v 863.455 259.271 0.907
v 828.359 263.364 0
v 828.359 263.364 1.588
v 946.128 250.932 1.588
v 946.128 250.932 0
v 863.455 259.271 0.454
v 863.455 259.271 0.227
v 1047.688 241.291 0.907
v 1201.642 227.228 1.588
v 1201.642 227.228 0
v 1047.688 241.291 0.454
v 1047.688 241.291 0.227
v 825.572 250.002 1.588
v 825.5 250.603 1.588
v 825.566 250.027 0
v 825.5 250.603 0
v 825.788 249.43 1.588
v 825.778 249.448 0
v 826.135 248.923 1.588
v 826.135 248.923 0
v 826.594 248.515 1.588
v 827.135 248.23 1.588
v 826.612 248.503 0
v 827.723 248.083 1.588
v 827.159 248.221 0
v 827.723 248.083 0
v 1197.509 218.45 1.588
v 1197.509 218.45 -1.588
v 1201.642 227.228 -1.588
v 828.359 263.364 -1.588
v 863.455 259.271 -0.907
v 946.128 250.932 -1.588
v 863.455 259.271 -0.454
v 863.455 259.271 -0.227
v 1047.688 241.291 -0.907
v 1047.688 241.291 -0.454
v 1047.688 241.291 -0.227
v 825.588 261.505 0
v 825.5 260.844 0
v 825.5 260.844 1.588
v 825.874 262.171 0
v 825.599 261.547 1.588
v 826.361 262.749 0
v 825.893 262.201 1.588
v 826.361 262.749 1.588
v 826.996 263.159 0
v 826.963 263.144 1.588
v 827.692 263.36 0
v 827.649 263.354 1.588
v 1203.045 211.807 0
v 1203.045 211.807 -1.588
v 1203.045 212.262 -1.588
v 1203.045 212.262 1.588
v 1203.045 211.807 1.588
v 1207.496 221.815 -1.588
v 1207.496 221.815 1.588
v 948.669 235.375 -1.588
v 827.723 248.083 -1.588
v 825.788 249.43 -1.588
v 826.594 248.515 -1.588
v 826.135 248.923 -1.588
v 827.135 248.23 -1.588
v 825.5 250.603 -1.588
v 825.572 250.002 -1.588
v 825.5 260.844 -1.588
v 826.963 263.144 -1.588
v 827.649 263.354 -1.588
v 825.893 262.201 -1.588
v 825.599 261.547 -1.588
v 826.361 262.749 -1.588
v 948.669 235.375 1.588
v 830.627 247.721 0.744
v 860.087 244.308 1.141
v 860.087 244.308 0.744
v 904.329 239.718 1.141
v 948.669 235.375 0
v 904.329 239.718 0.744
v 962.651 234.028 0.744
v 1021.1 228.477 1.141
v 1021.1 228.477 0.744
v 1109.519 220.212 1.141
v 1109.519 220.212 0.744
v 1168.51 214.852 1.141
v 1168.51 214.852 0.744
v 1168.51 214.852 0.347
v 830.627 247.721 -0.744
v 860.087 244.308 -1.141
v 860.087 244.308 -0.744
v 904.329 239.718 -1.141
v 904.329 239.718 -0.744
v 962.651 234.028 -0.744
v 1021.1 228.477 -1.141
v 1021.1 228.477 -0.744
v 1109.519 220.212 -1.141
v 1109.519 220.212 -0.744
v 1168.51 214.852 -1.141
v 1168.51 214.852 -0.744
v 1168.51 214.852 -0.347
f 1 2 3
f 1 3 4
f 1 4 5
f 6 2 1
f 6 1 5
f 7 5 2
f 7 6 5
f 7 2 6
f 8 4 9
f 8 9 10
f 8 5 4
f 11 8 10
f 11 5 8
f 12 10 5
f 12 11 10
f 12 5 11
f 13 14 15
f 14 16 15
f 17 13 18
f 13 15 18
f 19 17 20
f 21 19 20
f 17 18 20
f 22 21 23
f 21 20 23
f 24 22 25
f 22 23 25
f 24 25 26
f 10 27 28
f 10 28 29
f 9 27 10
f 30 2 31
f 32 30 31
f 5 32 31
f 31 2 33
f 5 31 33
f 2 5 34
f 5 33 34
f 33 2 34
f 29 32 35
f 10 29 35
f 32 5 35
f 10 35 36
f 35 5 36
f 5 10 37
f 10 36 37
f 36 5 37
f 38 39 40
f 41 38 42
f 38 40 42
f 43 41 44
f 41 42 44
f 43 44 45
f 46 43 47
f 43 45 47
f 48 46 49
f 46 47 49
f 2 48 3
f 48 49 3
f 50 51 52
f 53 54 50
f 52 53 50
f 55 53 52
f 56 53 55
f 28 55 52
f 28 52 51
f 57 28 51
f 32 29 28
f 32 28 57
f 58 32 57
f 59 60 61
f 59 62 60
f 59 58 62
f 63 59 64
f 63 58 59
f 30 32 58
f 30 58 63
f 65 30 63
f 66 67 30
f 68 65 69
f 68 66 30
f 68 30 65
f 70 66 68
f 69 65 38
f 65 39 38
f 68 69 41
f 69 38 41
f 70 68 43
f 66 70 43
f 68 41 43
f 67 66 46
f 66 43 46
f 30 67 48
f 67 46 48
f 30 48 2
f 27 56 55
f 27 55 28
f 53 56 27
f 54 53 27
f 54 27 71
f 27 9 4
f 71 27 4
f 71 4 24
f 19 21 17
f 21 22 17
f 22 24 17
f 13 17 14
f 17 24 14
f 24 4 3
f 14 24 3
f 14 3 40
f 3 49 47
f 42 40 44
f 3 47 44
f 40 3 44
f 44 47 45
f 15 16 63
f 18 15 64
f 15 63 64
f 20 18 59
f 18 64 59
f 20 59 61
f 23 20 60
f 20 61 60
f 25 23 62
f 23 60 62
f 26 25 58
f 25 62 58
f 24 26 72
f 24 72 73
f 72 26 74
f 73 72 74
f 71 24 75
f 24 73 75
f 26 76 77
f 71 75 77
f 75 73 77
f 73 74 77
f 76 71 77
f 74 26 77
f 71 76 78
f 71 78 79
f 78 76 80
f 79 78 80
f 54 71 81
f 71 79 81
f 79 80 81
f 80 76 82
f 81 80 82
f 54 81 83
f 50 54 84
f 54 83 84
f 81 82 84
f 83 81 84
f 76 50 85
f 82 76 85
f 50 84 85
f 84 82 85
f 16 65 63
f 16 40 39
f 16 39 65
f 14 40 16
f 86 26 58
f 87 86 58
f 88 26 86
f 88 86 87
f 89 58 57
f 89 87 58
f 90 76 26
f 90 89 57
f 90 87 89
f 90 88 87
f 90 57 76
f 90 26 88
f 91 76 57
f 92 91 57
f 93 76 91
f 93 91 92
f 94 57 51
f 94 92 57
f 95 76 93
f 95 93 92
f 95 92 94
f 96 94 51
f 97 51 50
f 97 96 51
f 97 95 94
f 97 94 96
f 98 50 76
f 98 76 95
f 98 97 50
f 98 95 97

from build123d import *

# Parameters (mm, degrees)
BOSS_EXTRUDE1_DEPTH = 1.5875
FILLET1_R           = 2.54
CUT_EXTRUDE1_DEPTH  = 7.62


with BuildPart() as part:
    # Sketch2 → Boss-Extrude1 (new body, symmetric)
    with BuildSketch(Plane.XY):
        with BuildLine():
            add(Edge.make_bspline(
                [(825.5, 263.72872798), (833.004293944, 262.763036085), (840.535916247, 261.846014478), (848.126574562, 260.964164828), (892.90639318, 255.945629274), (937.686211733, 251.779150949), (973.452075064, 248.227669425), (1071.946672141, 239.051054038), (1170.441269319, 229.731506738), (1231.791940344, 224.503945813), (1324.899336146, 216.790627817), (1418.006730935, 209.040117978), (1449.742935921, 206.361809936), (1636.928606778, 190.521130342), (1824.114277635, 175.409157235), (1979.966947376, 164.299650253), (2156.268639429, 150.414433314), (2332.570330468, 133.857216402), (2354.212983157, 131.78508222), (2394.341467798, 127.847039259), (2434.469952439, 123.717187755), (2453.57670361, 121.704562273), (2472.669581058, 119.647220503), (2491.74, 117.547195763)],
                knots=[78.681340958, 78.681340958, 78.681340958, 78.681340958, 78.681340958, 78.681340958, 82.46579272, 82.46579272, 82.46579272, 100.7932901, 100.7932901, 100.7932901, 131.0989539, 131.0989539, 131.0989539, 146.7691983, 146.7691983, 146.7691983, 223.5339586, 223.5339586, 223.5339586, 233.9431167, 233.9431167, 233.9431167, 243.40815085, 243.40815085, 243.40815085, 243.40815085, 243.40815085, 243.40815085], degree=5))
            Line((825.5, 263.72872798), (825.5, 248.364439806))
            add(Edge.make_bspline(
                [(825.5, 248.364439806), (827.20768691, 248.14708351), (833.784664511, 247.321927102), (845.28106727, 245.953419483), (860.086531547, 244.295598067), (879.830703434, 242.186646028), (904.369967092, 239.698279806), (933.571022669, 236.832150625), (962.642718041, 234.023667741), (991.762593943, 231.241975908), (1021.072010315, 228.475862291), (1060.376437315, 224.796956681), (1109.513015577, 220.184378862), (1168.511190361, 214.817071985), (1227.500129793, 209.662054042), (1306.133167947, 203.021178328), (1404.361477105, 194.920725932), (1522.239851071, 184.918066624), (1640.182856491, 175.167007786), (1758.165352567, 165.757639485), (1876.155384769, 156.590937079), (1994.08749188, 147.453250142), (2092.268692061, 139.624216053), (2170.748029042, 133.079656729), (2219.771730977, 128.842227836), (2258.983988247, 125.347211495), (2288.379457536, 122.670854497), (2317.812243116, 119.931729386), (2347.551509172, 117.100365283), (2377.159899727, 114.21011853), (2406.469653851, 111.26896801), (2435.81832606, 108.240091266), (2464.242715806, 105.222889554), (2482.876892709, 103.192325927), (2491.74, 102.214848055)],
                knots=[78.875303138, 78.875303138, 78.875303138, 78.875303138, 79.386176103, 80.841530691, 82.29688528, 83.752239868, 86.662949044, 89.57365822, 92.484367397, 95.395076573, 98.305785749, 101.216494926, 107.037913278, 112.859331631, 118.680749984, 124.502168336, 136.145005042, 147.787841747, 159.430678452, 171.073515158, 182.716351863, 194.359188568, 206.002025273, 211.823443626, 217.644861979, 220.555571155, 223.466280331, 226.376989508, 229.287698684, 232.19840786, 235.109117037, 238.019826213, 240.930535389, 243.57402126, 243.57402126, 243.57402126, 243.57402126], degree=3))
            Line((2491.74, 102.214848055), (2491.74, 117.547195763))
        make_face()
    extrude(amount=BOSS_EXTRUDE1_DEPTH, both=True)

    # Fillet1
    fillet1_edges = [part.edges().sort_by_distance(p)[0] for p in [
        (2491.74, 102.214848055, -0.79375),
        (2491.74, 117.547195763, -0.79375),
        (825.5, 248.364439806, -0.79375),
        (825.5, 263.72872798, 0.79375),
    ]]
    fillet(fillet1_edges, radius=FILLET1_R)

    # Sketch3 → Cut-Extrude1 (cut)
    with BuildSketch(Plane.XY.offset(1.5875)):
        Polygon((1201.641901464, 227.227804562), (1201.641901464, 233.657871268), (2527.666884392, 125.867495718), (2495.375554416, 68.882795761), (1203.044971141, 209.52849605), (1203.044971141, 212.261982037), (1207.495802024, 221.814984909), (1197.508571749, 218.449722533), align=None)
    extrude(amount=-CUT_EXTRUDE1_DEPTH, mode=Mode.SUBTRACT)


solid = part.part
